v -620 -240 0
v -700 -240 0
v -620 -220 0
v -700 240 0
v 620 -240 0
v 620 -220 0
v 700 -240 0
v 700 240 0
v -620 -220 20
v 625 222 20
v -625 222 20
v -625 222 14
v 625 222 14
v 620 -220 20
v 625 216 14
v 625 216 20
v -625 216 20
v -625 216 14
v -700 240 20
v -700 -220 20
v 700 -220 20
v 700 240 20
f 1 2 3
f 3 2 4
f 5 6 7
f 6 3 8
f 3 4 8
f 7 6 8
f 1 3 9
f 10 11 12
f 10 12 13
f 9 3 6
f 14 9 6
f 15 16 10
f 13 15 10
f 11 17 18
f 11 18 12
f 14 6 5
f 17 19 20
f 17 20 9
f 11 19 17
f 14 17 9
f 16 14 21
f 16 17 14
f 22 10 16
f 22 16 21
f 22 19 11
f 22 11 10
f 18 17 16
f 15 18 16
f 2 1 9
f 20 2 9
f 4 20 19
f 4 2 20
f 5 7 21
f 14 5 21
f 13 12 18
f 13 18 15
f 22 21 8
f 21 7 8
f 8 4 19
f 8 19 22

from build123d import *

# Parameters (mm, degrees)
F0_W     = 1400
F0_H     = 480
F1_DEPTH = 20
F3_DEPTH = 1400
F4_W     = 1250
F4_H     = 6
F5_DEPTH = 6
F6_W     = 1240
F6_H     = 20
F7_DEPTH = 20


with BuildPart() as f1:
    # F0 (on Top) → F1 (new body)
    with BuildSketch(Plane.XY):
        Rectangle(F0_W, F0_H)
    extrude(amount=F1_DEPTH)

    # F2 (on face) → F3 (cut)
    with BuildSketch(Plane.YZ.offset(700)):
        Polygon((-240, 20), (-240, 0), (-220, 20), align=None)
    extrude(amount=-F3_DEPTH, mode=Mode.SUBTRACT)

    # F4 (on face) → F5 (cut)
    with BuildSketch(Plane.XY.offset(20)):
        with Locations((0, 219)):
            Rectangle(F4_W, F4_H)
    extrude(amount=-F5_DEPTH, mode=Mode.SUBTRACT)

    # F6 (on face) → F7 (cut)
    with BuildSketch(Plane(origin=(0, 0, 0), x_dir=(1, 0, 0), z_dir=(0, 0, -1))):
        with Locations((0, 230)):
            Rectangle(F6_W, F6_H)
    extrude(amount=-F7_DEPTH, mode=Mode.SUBTRACT)


solid = f1.part
